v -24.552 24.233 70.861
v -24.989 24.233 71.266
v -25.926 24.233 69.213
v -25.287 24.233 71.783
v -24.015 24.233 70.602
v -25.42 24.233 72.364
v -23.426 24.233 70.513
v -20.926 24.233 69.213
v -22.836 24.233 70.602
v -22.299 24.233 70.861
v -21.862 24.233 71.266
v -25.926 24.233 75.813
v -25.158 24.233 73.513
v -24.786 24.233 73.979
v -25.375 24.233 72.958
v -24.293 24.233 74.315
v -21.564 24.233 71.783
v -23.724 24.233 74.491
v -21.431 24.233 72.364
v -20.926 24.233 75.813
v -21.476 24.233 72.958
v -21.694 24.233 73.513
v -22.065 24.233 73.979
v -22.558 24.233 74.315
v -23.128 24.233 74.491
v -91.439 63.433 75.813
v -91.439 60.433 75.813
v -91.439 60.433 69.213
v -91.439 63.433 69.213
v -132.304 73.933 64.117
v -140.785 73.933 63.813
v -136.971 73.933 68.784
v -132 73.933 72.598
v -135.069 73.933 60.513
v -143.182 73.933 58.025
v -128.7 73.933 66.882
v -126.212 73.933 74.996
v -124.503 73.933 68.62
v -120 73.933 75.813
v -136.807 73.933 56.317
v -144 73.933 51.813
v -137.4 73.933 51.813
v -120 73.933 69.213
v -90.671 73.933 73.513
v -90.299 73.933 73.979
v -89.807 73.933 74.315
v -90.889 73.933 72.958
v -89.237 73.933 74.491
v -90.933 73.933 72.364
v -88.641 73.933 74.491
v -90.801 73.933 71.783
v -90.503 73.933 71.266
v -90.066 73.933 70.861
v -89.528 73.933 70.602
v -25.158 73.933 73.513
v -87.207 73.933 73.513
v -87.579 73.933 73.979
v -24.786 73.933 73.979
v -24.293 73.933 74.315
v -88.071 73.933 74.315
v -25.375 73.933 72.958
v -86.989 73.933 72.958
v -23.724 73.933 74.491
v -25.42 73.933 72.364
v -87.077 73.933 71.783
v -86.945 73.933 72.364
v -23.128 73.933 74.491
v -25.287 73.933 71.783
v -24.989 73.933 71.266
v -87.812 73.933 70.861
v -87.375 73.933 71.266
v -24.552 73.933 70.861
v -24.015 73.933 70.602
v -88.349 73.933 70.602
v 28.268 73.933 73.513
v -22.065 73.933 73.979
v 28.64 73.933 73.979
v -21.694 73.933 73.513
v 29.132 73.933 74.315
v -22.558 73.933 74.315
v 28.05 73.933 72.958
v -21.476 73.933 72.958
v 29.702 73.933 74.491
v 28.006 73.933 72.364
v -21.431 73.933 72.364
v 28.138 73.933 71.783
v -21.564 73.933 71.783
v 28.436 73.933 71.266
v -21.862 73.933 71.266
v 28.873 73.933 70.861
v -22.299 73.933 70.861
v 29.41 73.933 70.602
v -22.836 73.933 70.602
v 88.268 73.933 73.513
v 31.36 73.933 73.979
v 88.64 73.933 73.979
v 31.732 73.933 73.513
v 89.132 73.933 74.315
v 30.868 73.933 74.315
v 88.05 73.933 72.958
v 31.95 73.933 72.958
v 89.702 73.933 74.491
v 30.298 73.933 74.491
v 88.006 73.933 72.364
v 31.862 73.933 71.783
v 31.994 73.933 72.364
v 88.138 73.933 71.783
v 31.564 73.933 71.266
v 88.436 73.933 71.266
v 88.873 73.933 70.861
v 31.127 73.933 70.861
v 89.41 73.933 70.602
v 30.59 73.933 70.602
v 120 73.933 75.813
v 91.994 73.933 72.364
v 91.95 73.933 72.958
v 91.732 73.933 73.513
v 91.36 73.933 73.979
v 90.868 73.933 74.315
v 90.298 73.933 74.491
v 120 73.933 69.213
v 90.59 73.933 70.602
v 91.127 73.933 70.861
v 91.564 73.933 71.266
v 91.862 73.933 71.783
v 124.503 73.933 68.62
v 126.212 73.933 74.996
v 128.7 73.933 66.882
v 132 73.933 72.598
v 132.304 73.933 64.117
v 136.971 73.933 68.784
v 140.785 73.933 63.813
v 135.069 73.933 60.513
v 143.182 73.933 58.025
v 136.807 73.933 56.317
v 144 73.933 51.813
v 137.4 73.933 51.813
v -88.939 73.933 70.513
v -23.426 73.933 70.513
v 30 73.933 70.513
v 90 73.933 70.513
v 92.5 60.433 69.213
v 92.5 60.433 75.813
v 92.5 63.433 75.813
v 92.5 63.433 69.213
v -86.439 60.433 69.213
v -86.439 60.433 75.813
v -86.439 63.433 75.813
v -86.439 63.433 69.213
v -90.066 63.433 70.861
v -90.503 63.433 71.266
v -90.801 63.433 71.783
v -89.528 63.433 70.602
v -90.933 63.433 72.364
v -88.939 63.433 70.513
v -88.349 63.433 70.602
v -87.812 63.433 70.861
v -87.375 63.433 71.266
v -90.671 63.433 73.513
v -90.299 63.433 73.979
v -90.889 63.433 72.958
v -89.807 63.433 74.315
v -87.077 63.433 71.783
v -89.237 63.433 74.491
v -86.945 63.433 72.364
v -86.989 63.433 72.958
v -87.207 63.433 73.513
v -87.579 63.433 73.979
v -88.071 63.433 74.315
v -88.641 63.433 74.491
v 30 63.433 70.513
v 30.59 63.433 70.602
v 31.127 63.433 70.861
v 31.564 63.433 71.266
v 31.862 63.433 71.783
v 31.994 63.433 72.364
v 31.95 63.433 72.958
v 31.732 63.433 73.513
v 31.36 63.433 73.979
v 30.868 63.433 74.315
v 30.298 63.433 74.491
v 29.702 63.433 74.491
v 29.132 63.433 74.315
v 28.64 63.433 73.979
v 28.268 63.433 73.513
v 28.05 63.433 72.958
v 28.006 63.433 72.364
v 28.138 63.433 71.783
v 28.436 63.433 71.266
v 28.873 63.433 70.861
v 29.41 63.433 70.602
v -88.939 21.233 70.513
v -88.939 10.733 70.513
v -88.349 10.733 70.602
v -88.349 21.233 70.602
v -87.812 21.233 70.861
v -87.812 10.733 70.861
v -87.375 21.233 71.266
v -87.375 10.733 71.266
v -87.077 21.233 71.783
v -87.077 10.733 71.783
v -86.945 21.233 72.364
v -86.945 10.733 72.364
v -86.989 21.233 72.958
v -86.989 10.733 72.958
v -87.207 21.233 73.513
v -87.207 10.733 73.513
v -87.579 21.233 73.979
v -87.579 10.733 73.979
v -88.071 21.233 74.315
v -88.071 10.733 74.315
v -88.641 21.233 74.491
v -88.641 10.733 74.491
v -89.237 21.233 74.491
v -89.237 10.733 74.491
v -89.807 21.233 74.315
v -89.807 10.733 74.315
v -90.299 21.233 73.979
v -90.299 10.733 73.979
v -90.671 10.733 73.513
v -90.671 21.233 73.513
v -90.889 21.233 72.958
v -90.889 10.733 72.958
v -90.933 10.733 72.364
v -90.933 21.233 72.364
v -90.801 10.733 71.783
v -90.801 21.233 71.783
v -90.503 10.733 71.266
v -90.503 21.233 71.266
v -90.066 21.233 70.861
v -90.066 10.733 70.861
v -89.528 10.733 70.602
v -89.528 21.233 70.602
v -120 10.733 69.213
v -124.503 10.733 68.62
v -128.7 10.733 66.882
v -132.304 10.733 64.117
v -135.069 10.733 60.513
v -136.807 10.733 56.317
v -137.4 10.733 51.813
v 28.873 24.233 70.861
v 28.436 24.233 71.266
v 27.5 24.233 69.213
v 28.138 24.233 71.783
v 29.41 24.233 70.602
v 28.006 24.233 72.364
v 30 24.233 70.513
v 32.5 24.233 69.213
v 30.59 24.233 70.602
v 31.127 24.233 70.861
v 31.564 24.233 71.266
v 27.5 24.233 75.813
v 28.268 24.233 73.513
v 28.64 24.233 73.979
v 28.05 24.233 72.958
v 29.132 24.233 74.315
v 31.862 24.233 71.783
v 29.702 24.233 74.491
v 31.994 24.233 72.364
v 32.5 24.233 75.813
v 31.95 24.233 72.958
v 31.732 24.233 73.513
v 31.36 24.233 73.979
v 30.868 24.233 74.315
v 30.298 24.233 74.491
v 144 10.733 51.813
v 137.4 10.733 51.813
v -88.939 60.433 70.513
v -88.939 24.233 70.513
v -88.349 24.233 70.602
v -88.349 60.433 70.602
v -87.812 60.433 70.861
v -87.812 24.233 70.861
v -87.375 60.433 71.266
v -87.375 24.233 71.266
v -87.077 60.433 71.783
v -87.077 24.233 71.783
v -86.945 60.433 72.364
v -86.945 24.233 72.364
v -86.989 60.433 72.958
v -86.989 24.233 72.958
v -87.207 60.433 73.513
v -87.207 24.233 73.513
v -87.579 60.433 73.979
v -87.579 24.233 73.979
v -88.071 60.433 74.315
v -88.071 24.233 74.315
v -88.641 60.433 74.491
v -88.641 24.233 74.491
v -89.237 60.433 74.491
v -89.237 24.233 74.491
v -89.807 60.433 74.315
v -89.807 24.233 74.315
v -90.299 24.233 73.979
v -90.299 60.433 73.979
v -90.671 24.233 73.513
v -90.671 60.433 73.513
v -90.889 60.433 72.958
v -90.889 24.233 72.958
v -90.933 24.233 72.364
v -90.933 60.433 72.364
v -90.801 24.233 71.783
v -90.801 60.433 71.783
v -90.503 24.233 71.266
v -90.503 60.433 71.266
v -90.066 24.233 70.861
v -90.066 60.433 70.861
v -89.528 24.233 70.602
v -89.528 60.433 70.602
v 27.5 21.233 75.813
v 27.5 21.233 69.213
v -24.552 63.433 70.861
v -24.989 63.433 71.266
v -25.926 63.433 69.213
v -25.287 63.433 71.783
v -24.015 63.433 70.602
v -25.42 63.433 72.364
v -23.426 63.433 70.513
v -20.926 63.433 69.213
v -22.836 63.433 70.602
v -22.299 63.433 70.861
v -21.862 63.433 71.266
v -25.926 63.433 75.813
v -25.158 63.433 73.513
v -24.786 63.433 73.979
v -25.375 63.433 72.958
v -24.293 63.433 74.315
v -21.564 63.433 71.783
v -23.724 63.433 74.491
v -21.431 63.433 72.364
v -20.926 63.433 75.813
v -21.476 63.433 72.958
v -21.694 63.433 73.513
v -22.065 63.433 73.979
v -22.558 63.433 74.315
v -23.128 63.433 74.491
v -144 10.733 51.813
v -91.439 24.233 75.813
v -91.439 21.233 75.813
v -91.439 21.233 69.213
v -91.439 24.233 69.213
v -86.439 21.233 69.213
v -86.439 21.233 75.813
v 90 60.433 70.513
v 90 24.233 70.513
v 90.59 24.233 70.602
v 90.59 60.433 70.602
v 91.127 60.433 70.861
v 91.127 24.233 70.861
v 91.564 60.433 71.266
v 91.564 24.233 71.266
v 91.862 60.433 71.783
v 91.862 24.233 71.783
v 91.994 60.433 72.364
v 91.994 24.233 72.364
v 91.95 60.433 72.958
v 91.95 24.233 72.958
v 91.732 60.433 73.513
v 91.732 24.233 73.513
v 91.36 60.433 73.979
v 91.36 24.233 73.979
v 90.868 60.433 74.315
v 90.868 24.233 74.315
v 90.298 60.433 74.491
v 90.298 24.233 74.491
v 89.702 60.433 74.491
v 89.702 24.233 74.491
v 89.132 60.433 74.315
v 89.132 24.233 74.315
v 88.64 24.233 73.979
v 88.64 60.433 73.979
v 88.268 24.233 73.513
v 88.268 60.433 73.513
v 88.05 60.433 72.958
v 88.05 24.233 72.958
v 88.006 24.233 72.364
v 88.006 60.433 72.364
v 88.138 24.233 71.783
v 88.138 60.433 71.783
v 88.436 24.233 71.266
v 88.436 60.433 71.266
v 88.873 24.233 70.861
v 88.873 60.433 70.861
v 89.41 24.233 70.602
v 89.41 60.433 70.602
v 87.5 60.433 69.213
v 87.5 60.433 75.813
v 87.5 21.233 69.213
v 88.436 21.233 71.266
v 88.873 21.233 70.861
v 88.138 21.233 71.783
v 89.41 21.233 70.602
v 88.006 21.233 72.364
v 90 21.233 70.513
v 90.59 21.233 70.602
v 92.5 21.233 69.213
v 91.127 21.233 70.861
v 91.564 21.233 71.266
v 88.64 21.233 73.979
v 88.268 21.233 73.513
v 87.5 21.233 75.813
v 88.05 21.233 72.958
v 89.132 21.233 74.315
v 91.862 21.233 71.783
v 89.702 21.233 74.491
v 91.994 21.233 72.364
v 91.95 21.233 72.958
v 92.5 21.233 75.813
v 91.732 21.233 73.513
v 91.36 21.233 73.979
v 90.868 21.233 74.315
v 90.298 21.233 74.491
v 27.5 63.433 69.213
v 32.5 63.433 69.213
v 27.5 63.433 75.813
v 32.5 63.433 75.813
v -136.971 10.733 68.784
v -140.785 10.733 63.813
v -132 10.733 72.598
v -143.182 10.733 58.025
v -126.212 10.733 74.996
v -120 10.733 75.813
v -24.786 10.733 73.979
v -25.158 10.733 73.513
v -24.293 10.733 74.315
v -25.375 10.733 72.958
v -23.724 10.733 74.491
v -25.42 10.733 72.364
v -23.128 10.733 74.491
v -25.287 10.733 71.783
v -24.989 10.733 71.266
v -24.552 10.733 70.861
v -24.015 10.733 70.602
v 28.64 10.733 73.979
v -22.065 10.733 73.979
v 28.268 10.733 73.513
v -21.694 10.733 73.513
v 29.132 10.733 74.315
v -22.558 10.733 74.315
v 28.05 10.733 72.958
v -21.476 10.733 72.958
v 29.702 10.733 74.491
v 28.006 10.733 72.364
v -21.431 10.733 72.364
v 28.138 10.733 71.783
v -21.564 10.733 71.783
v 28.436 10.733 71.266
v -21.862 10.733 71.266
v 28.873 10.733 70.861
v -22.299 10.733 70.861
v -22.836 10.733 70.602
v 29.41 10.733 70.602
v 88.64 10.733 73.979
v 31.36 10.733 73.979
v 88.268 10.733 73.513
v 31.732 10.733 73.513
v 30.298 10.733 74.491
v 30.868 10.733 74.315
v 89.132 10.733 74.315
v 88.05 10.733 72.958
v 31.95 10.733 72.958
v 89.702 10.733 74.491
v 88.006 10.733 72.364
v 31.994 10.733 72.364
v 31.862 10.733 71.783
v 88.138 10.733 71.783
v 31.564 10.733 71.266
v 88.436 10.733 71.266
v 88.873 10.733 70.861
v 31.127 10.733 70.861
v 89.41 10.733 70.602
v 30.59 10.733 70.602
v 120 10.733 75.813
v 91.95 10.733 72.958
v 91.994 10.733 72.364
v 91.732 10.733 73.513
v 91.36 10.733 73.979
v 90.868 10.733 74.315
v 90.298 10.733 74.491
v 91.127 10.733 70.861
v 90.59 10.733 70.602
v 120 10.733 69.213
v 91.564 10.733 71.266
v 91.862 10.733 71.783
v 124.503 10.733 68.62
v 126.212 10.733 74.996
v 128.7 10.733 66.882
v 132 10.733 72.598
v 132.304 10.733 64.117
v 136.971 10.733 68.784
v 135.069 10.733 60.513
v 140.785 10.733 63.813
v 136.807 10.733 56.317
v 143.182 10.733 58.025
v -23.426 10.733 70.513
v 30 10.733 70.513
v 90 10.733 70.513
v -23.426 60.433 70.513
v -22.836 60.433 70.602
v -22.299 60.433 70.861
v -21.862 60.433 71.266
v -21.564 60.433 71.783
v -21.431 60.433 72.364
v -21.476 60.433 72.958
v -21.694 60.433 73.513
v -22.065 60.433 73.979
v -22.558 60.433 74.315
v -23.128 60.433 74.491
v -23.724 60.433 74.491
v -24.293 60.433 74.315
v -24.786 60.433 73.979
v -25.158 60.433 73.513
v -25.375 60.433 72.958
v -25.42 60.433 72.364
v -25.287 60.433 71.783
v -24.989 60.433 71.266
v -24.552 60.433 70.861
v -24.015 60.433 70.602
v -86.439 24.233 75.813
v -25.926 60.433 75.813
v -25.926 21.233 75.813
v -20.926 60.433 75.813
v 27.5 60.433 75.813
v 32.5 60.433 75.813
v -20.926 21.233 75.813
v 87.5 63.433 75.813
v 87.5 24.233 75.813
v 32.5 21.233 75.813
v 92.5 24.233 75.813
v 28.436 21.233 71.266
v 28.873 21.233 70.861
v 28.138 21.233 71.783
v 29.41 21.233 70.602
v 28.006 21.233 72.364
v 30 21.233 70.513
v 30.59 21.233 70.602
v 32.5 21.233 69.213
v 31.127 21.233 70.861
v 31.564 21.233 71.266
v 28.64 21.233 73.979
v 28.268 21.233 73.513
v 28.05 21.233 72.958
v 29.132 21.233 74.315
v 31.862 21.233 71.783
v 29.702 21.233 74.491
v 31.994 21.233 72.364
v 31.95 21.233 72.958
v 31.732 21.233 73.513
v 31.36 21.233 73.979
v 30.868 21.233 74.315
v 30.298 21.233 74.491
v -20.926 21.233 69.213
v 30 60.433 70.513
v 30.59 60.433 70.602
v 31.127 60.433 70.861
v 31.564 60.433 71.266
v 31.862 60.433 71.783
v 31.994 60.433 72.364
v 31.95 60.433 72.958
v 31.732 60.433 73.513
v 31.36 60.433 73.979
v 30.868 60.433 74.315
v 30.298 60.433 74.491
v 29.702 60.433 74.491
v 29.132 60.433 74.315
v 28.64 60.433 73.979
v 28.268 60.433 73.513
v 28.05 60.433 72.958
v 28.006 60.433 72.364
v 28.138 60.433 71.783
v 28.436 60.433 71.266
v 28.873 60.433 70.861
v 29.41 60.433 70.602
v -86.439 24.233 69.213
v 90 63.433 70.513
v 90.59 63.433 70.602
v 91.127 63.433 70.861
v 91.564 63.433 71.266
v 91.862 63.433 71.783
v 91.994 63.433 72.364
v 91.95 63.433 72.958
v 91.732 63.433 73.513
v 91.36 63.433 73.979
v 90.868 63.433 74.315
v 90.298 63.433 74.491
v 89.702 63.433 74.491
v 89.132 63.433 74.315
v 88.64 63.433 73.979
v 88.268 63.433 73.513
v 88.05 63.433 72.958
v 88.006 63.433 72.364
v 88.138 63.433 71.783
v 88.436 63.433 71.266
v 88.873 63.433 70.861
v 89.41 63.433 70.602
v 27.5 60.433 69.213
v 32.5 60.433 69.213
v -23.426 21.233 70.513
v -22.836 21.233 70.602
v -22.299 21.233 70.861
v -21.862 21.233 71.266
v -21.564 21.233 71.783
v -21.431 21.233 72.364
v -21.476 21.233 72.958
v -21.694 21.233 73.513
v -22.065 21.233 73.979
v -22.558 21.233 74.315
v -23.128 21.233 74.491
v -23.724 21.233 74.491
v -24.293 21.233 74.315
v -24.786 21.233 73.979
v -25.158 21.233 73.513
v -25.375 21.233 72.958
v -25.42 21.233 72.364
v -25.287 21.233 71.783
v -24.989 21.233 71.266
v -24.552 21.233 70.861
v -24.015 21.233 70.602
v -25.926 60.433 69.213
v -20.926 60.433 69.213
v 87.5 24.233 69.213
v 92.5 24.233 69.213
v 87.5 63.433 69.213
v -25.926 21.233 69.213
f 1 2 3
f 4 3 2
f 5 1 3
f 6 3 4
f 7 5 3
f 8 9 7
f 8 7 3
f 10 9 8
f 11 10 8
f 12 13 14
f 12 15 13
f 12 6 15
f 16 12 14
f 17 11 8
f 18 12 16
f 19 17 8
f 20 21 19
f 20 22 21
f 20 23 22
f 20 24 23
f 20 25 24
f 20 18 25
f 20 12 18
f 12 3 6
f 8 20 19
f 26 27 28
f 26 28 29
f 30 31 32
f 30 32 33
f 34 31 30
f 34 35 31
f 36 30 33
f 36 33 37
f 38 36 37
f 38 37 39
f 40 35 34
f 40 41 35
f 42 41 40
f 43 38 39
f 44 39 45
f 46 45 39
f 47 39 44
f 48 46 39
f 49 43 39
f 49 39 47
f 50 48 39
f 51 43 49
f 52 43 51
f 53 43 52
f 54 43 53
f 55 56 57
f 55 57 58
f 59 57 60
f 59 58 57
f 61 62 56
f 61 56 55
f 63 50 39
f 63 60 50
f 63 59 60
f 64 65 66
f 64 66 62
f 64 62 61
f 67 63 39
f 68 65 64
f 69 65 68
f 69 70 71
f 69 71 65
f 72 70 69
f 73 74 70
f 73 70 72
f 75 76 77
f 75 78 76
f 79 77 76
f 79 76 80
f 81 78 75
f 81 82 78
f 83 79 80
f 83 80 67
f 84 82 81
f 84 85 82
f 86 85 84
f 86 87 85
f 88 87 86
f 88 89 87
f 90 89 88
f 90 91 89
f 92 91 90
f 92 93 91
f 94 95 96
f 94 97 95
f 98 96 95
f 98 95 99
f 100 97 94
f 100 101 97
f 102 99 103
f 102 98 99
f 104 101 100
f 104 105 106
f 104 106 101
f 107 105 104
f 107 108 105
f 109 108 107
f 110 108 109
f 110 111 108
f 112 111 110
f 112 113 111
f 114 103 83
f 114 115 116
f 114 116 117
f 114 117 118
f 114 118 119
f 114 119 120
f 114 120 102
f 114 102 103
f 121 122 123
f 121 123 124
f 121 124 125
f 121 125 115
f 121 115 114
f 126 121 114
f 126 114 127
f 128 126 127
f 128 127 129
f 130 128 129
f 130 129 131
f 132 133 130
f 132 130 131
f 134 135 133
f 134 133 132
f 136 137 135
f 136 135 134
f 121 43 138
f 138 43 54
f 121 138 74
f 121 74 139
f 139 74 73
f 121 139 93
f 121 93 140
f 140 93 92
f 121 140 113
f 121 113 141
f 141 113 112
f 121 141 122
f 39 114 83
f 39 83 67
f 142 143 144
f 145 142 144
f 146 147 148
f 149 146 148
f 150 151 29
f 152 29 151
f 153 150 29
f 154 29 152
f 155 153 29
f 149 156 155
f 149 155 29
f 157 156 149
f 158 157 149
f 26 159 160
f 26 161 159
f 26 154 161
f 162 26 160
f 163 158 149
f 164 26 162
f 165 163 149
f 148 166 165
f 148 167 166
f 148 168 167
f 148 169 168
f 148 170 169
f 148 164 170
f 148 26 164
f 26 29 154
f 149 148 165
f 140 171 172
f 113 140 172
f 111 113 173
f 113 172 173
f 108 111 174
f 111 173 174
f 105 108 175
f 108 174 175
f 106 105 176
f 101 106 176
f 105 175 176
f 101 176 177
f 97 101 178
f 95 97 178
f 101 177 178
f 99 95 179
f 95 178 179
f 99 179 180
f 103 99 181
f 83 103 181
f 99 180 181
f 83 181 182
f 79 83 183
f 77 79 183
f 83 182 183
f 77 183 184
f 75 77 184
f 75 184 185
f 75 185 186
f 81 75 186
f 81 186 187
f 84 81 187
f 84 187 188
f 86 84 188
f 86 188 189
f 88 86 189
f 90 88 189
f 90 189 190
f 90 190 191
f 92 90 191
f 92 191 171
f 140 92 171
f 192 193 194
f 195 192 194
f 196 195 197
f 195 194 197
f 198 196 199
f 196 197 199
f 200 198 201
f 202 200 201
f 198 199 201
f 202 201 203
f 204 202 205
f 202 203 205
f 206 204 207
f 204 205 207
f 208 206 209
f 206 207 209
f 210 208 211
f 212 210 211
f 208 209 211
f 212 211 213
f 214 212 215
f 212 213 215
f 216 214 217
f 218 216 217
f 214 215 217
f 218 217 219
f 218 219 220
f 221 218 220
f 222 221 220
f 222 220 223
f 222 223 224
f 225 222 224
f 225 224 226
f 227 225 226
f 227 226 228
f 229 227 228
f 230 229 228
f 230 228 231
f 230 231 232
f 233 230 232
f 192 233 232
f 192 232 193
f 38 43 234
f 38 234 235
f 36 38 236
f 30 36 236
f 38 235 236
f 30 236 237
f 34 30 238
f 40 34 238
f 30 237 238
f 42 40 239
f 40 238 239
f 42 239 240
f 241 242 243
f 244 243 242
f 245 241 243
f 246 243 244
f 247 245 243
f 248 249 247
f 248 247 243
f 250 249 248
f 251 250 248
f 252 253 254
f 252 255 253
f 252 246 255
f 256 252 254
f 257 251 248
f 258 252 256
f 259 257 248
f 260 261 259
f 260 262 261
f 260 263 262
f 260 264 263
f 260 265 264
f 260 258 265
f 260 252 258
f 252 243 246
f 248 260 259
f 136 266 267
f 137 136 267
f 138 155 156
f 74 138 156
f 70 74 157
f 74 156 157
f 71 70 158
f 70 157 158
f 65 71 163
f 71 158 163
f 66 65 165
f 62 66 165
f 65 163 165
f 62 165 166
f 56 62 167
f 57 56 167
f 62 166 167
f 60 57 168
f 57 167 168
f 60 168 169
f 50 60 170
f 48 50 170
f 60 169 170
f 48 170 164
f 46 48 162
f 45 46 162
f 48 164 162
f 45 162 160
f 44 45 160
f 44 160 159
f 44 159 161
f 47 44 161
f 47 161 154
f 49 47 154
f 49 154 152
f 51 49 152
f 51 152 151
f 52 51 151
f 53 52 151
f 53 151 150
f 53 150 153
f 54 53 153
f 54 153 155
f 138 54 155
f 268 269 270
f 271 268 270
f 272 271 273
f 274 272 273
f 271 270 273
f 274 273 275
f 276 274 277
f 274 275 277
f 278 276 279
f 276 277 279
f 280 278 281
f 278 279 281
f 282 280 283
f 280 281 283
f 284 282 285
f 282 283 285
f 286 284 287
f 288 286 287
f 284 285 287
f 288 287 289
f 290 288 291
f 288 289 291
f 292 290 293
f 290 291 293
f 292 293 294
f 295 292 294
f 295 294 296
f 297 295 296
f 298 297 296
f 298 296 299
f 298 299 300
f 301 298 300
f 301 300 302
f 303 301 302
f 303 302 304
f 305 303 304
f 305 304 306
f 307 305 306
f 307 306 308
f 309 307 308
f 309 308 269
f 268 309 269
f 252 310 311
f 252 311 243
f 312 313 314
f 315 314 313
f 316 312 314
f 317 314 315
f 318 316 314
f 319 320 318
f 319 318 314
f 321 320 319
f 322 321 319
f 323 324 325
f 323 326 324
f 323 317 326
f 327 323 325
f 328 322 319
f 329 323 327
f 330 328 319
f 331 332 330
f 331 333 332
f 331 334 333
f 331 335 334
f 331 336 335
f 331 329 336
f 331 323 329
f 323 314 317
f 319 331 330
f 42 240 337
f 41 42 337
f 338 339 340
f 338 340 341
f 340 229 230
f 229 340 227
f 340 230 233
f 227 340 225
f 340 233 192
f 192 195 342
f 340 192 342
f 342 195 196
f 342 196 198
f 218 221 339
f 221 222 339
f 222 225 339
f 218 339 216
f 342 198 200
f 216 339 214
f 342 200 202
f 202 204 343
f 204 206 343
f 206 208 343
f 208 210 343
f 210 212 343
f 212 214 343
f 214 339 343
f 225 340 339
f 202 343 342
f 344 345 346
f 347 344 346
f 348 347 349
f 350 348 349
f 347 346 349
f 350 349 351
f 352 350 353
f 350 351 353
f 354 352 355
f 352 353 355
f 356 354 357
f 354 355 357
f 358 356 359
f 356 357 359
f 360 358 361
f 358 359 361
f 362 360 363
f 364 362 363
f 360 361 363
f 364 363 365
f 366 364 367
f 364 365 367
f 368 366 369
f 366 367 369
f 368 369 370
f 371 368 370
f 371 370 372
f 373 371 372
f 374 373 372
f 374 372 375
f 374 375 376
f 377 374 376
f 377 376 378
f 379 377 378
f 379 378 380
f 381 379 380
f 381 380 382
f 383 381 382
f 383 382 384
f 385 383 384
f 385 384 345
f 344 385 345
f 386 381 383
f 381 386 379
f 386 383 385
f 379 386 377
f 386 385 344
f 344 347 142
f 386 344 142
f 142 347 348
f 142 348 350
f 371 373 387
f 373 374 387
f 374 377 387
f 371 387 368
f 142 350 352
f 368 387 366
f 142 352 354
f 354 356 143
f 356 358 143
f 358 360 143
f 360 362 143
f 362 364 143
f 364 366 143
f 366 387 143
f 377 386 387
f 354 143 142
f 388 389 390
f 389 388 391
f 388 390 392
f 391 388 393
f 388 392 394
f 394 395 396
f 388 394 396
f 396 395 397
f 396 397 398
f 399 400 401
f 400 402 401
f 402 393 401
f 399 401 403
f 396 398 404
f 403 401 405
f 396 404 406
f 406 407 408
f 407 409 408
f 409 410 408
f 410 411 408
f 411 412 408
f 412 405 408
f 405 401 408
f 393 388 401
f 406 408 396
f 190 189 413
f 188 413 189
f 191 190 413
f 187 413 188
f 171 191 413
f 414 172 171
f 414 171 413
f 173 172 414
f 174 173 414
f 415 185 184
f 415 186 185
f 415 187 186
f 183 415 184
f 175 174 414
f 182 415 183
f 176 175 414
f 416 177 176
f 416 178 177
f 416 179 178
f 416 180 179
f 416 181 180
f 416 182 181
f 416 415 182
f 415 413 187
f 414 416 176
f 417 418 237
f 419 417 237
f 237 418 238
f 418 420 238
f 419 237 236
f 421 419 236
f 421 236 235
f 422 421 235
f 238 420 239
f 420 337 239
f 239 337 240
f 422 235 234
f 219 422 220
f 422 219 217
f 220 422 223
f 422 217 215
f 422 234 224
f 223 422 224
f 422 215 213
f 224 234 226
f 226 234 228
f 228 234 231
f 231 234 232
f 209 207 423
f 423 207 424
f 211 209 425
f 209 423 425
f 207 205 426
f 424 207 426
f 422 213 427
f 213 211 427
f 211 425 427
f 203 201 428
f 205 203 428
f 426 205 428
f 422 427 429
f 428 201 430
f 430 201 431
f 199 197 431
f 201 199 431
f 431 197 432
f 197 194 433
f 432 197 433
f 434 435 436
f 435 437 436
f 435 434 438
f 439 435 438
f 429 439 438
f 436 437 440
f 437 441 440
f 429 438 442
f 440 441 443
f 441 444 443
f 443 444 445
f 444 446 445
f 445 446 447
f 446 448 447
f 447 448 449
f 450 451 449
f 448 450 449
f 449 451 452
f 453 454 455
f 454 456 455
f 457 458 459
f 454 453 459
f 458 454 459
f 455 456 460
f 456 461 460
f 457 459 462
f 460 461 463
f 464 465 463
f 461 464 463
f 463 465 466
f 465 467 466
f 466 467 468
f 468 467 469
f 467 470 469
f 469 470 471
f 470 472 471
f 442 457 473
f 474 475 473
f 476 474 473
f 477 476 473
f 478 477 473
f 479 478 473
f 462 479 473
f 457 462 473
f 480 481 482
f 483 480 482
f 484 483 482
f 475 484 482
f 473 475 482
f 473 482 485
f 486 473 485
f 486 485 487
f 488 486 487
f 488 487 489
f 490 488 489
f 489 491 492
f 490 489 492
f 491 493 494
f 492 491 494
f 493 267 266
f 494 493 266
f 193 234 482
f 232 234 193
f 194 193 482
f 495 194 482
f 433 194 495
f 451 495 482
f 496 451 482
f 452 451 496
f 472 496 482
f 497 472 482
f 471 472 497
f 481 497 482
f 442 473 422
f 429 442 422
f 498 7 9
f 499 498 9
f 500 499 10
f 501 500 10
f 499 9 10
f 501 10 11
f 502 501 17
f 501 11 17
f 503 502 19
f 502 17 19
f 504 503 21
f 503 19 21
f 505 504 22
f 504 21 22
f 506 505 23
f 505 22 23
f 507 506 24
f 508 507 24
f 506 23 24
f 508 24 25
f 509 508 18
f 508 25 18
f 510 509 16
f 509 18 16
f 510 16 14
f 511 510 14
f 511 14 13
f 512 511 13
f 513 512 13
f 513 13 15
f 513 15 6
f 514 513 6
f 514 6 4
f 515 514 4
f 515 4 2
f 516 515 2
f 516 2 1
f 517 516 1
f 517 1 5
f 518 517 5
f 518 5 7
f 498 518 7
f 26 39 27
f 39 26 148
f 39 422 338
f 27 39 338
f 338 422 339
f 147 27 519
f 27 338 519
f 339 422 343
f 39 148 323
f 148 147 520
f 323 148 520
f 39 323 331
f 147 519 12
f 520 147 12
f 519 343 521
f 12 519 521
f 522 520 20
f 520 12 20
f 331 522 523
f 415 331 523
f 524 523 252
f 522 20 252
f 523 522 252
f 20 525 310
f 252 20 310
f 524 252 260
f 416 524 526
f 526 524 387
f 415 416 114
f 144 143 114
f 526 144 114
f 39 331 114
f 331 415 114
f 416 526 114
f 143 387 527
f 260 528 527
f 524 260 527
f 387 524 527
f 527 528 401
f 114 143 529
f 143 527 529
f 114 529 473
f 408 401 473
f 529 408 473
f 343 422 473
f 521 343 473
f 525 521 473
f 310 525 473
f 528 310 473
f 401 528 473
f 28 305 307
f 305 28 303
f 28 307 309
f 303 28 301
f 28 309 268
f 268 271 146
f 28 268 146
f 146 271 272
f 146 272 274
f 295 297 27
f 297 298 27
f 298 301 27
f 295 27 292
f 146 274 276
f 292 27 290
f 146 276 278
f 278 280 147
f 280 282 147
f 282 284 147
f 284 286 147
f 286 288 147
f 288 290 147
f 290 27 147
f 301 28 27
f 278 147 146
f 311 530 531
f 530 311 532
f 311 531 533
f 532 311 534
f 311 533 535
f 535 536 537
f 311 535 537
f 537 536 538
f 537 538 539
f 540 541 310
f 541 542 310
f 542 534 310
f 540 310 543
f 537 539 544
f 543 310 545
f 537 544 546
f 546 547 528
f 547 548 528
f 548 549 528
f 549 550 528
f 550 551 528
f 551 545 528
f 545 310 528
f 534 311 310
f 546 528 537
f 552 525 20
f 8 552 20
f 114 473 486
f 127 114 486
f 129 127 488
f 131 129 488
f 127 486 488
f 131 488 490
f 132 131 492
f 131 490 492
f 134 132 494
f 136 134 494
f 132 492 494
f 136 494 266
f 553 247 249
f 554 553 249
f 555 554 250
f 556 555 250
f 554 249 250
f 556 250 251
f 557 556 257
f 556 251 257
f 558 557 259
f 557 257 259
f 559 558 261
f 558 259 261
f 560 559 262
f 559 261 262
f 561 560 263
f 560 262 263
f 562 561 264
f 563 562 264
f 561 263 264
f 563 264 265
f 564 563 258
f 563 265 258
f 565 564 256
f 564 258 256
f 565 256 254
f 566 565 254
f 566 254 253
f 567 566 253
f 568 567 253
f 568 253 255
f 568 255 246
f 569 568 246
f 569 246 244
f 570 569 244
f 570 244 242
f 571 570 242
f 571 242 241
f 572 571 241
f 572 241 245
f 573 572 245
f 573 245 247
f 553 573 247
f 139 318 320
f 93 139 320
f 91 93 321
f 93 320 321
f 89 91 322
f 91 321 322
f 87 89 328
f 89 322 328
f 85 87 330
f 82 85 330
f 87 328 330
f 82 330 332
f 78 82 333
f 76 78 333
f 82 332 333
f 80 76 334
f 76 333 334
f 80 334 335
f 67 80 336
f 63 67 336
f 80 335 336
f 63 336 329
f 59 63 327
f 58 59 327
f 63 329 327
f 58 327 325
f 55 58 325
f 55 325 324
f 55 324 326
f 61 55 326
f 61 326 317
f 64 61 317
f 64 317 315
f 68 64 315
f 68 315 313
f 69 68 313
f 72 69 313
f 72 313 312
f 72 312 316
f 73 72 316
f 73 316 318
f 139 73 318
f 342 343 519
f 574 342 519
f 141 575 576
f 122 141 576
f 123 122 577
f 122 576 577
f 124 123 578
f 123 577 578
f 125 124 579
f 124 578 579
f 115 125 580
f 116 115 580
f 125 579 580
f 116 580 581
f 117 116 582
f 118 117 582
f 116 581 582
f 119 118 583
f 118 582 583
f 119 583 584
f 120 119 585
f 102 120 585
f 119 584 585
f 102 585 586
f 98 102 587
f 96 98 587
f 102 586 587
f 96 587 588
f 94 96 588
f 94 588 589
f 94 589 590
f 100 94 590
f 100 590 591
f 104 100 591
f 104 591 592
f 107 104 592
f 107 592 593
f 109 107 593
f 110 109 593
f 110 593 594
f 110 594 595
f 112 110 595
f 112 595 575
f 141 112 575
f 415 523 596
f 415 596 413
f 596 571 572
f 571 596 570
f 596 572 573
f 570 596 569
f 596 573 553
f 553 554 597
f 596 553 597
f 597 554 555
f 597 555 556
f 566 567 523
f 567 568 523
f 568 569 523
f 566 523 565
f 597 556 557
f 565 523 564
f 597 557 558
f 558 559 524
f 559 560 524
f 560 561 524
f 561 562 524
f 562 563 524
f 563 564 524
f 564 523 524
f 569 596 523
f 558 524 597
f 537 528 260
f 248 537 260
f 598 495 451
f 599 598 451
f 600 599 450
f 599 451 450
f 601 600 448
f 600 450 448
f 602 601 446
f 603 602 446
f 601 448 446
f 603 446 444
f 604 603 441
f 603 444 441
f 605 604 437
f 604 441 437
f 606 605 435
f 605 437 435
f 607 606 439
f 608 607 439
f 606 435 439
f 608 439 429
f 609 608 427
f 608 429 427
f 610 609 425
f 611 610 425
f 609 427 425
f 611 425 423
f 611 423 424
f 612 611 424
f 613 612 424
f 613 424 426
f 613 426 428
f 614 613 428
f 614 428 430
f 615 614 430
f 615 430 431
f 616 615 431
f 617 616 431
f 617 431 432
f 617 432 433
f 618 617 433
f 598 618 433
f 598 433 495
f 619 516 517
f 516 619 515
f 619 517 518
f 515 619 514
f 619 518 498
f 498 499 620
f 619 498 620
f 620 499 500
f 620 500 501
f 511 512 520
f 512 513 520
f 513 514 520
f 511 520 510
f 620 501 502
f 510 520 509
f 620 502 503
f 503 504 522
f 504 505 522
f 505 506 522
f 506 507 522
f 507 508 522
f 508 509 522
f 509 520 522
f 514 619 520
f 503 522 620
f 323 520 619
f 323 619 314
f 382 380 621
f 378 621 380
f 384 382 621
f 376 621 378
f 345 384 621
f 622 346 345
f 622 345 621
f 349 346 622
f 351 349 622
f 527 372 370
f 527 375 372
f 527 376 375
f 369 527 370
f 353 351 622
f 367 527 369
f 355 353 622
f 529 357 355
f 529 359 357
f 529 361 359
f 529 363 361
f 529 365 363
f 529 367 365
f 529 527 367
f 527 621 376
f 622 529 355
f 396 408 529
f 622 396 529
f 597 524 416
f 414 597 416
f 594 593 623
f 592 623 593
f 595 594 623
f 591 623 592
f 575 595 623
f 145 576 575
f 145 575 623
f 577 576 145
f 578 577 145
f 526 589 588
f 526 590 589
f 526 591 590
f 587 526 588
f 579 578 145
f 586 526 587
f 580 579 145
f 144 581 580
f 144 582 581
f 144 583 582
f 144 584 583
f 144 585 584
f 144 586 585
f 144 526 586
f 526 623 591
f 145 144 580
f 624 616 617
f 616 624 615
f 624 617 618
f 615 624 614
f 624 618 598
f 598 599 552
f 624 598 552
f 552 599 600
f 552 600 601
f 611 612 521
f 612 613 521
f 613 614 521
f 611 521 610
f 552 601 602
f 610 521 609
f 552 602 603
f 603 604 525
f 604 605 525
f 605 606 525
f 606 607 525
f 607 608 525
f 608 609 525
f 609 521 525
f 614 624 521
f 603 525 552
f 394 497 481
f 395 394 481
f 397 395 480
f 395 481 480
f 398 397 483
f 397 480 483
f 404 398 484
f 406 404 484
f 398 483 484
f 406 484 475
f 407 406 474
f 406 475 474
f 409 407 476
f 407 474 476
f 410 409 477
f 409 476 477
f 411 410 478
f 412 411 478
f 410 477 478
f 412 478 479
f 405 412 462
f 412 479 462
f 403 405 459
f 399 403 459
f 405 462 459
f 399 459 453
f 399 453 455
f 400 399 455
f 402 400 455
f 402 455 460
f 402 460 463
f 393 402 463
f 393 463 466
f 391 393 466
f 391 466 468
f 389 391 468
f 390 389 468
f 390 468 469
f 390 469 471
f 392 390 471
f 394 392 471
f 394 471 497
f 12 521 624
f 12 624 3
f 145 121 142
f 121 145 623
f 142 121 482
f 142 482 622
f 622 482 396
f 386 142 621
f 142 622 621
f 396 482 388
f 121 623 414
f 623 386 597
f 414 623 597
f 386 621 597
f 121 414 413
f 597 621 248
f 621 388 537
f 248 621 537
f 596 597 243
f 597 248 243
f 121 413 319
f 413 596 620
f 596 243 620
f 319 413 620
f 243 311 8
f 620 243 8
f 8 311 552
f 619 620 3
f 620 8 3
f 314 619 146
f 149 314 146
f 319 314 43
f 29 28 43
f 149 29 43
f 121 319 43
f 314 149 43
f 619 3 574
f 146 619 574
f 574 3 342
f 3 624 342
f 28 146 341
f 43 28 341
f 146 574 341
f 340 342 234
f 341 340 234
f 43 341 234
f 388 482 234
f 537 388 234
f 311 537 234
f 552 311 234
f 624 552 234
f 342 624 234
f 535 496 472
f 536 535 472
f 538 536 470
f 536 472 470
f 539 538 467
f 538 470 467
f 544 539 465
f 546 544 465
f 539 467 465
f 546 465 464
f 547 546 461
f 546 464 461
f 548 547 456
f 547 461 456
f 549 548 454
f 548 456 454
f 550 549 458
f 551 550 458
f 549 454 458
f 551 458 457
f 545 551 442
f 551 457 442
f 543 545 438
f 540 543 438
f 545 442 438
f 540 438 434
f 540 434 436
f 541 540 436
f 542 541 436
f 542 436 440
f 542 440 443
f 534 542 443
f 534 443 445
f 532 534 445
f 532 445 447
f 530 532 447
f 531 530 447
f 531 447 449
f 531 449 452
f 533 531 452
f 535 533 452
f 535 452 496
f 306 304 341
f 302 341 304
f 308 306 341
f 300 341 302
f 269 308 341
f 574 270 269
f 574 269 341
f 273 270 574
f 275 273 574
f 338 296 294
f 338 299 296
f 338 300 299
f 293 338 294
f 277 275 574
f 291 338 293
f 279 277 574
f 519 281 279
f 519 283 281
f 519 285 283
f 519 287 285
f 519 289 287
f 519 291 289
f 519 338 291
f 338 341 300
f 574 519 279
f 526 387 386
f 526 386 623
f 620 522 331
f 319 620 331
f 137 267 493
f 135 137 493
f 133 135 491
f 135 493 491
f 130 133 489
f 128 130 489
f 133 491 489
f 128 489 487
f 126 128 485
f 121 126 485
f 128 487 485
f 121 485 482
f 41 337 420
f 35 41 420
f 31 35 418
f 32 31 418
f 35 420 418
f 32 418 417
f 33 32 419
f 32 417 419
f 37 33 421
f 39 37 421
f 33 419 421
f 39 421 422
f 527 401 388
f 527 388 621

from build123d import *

# Parameters (mm, degrees)
BOSS_EXTRUDE1_DEPTH      = 16
BOSS_EXTRUDE2_DEPTH      = 46.583974855
BOSS_EXTRUDE2_DEPTH_BACK = 46.58397486
SKETCH4_R                = 3.3
CUT_EXTRUDE1_DEPTH       = 32.2
CUT_EXTRUDE1_DEPTH_BACK  = 32.2
SKETCH5_R                = 3.3
SKETCH6_W                = 20
SKETCH6_H                = 11
BOSS_EXTRUDE3_DEPTH      = 30
CUT_EXTRUDE2_DEPTH       = 233.824504724
CUT_EXTRUDE2_DEPTH_BACK  = 233.824504724
SKETCH7_R                = 2
SKETCH8_W                = 40
SKETCH8_H                = 11
CUT_EXTRUDE3_DEPTH       = 40
SKETCH9_R                = 2
CUT_EXTRUDE4_DEPTH       = 40
FILLET1_R                = 20
BOSS_EXTRUDE4_DEPTH      = 52.66666667
SKETCH11_W               = 287.599331825
SKETCH11_H               = 200.78083169
CUT_EXTRUDE5_DEPTH       = 16
SCALE1_START             = 16
SCALE1_DEPTH             = 52.66666667
SCALE1_START_2           = 2.833333333
SCALE1_2_DEPTH           = 79.000000004
SKETCH15_W               = 527.18296214
SKETCH15_H               = 284.392361206
CUT_EXTRUDE9_DEPTH       = 200
SCALE2_SCALE             = 0.8
SKETCH23_R               = 2
CUT_EXTRUDE15_DEPTH      = 175.579201349
SKETCH25_R               = 2
CUT_EXTRUDE18_DEPTH      = 175.579201349
SKETCH28_W               = 5
SKETCH28_H               = 3
CUT_EXTRUDE19_DEPTH      = 164.640269427


# Read off the part's stored shape, not the designer's step: Scale1
with BuildPart() as part:
    # Sketch1 → Boss-Extrude1 (new body)
    with BuildSketch(Plane(origin=(0, 0, 0), x_dir=(1, 0, 0), z_dir=(0, 1, 0))):
        Polygon((-120, -37.5), (-120, -75), (0, -75), (0, 75), (-120, 75), (-120, 37.5), (-220, 37.5), (-220, -37.5), align=None)
    extrude(amount=BOSS_EXTRUDE1_DEPTH)

    # Sketch4 → Boss-Extrude2 (add, two sides: drawn at the far end of the back side and taken through both)
    # profile 1 of 2: a face of its own
    with BuildSketch(Plane.ZY.offset(170).offset(-BOSS_EXTRUDE2_DEPTH_BACK)):
        with BuildLine():
            Line((37.5, 16), (43.5, 16))
            ThreePointArc((43.5, 16), (51.5, 8), (43.5, 0))
            Line((43.5, 0), (37.5, 0))
            Line((37.5, 0), (37.5, 16))
        make_face()
        with Locations((43.5, 8)):
            Circle(SKETCH4_R, mode=Mode.SUBTRACT)
    # profile 2 of 2: a face of its own
    with BuildSketch(Plane.ZY.offset(170).offset(-BOSS_EXTRUDE2_DEPTH_BACK)):
        with BuildLine():
            Line((-37.5, 0), (-43.5, 0))
            ThreePointArc((-43.5, 0), (-51.5, 8), (-43.5, 16))
            Line((-43.5, 16), (-37.5, 16))
            Line((-37.5, 16), (-37.5, 0))
        make_face()
        with Locations((-43.5, 8)):
            Circle(SKETCH4_R, mode=Mode.SUBTRACT)
    extrude(amount=BOSS_EXTRUDE2_DEPTH + BOSS_EXTRUDE2_DEPTH_BACK)

    # Sketch5 → Cut-Extrude1 (cut, two sides: drawn at the far end of the back side and taken through both)
    # profile 1 of 2: a face of its own
    with BuildSketch(Plane.ZY.offset(170).offset(-CUT_EXTRUDE1_DEPTH_BACK)):
        with BuildLine():
            Line((-43.5, 16), (-37.5, 16))
            Line((-37.5, 16), (-37.5, 0))
            Line((-37.5, 0), (-43.5, 0))
            ThreePointArc((-43.5, 0), (-51.5, 8), (-43.5, 16))
        make_face()
        with Locations((-43.5, 8)):
            Circle(SKETCH5_R, mode=Mode.SUBTRACT)
    # profile 2 of 2: a face of its own
    with BuildSketch(Plane.ZY.offset(170).offset(-CUT_EXTRUDE1_DEPTH_BACK)):
        with BuildLine():
            Line((37.5, 0), (43.5, 0))
            ThreePointArc((43.5, 0), (51.5, 8), (43.5, 16))
            Line((43.5, 16), (37.5, 16))
            Line((37.5, 16), (37.5, 0))
        make_face()
        with Locations((43.5, 8)):
            Circle(SKETCH5_R, mode=Mode.SUBTRACT)
    extrude(amount=CUT_EXTRUDE1_DEPTH + CUT_EXTRUDE1_DEPTH_BACK, mode=Mode.SUBTRACT)

    # Sketch6 → Boss-Extrude3 (add)
    with BuildSketch(Plane(origin=(0, 0, 0), x_dir=(0, 0, -1), z_dir=(1, 0, 0))):
        with Locations((-50, 8)):
            Rectangle(SKETCH6_W, SKETCH6_H)
        with Locations((50, 8)):
            Rectangle(SKETCH6_W, SKETCH6_H)
    extrude(amount=BOSS_EXTRUDE3_DEPTH)

    # Sketch7 → Cut-Extrude2 (cut, two sides: drawn at the far end of the back side and taken through both)
    with BuildSketch(Plane(origin=(0, 13.5, 0), x_dir=(1, 0, 0), z_dir=(0, 1, 0)).offset(-CUT_EXTRUDE2_DEPTH_BACK)):
        with Locations(Location((22.5, 50, 0), (0, 0, 270))):
            Circle(SKETCH7_R)
        with Locations(Location((22.5, -50, 0), (0, 0, 270))):
            Circle(SKETCH7_R)
    extrude(amount=CUT_EXTRUDE2_DEPTH + CUT_EXTRUDE2_DEPTH_BACK, mode=Mode.SUBTRACT)

    # Sketch8 → Cut-Extrude3 (cut)
    with BuildSketch(Plane(origin=(0, 0, 0), x_dir=(0, 0, -1), z_dir=(1, 0, 0))):
        with Locations((0, 8)):
            Rectangle(SKETCH8_W, SKETCH8_H)
    extrude(amount=-CUT_EXTRUDE3_DEPTH, mode=Mode.SUBTRACT)

    # Sketch9 → Cut-Extrude4 (cut)
    with BuildSketch(Plane(origin=(0, 16, 0), x_dir=(1, 0, 0), z_dir=(0, 1, 0))):
        with Locations(Location((-32.5, 0, 0), (0, 0, 270))):
            Circle(SKETCH9_R)
    extrude(amount=-CUT_EXTRUDE4_DEPTH, mode=Mode.SUBTRACT)

    # Fillet1
    # the kernel refuses this fillet: 20 mm, written as the material it takes off along each edge
    with BuildSketch(Plane(origin=(-220, -27.947694226, -37.5), x_dir=(0, 0, 1), z_dir=(0, 1, 0))) as fillet1_piece_1:
        with BuildLine():
            CenterArc((11.17907769, 20), FILLET1_R, 236.01651728, 33.98348272)
            Line((0, 3.416025145), (-0.223581554, 3.084345648))
            ThreePointArc((-0.223581554, 3.084345648), (-0.4, 1.708012572), (-0.4, 0))
            Line((-0.4, 0), (0, -0.4))
            Line((0, -0.4), (11.17907769, -0.4))
            Line((11.17907769, -0.4), (11.17907769, 0))
        make_face()
    extrude(amount=71.895388452, mode=Mode.SUBTRACT)
    with BuildSketch(Plane(origin=(-220, -27.947694226, 37.5), x_dir=(1, 0, 0), z_dir=(0, 1, 0))) as fillet1_piece_2:
        with BuildLine():
            CenterArc((20, 11.17907769), FILLET1_R, 180, 33.98348272)
            Line((0, 11.17907769), (-0.4, 11.17907769))
            Line((-0.4, 11.17907769), (-0.4, 0))
            Line((-0.4, 0), (0, -0.4))
            ThreePointArc((0, -0.4), (1.708012572, -0.4), (3.084345648, -0.223581554))
            Line((3.084345648, -0.223581554), (3.416025145, 0))
        make_face()
    extrude(amount=71.895388452, mode=Mode.SUBTRACT)
    with BuildSketch(Plane(origin=(-120, -50, -75), x_dir=(1, 0, 0), z_dir=(0, 1, 0)), Plane(origin=(-120, -50, 75), x_dir=(0, 0, -1), z_dir=(0, 1, 0))) as fillet1_piece_3:
        with BuildLine():
            CenterArc((FILLET1_R, -FILLET1_R), FILLET1_R, 90, 90)
            Line((0, -FILLET1_R), (-FILLET1_R * 0.02, -FILLET1_R))
            Line((-FILLET1_R * 0.02, -FILLET1_R), (-FILLET1_R * 0.02, FILLET1_R * 0.02))
            Line((-FILLET1_R * 0.02, FILLET1_R * 0.02), (FILLET1_R, FILLET1_R * 0.02))
            Line((FILLET1_R, FILLET1_R * 0.02), (FILLET1_R, 0))
        make_face()
    extrude(amount=116, mode=Mode.SUBTRACT)

    # Sketch10 → Boss-Extrude4 (add)
    with BuildSketch(Plane(origin=(0, 16, 0), x_dir=(1, 0, 0), z_dir=(0, 1, 0))):
        with BuildLine():
            Line((0, 69.5), (-100, 69.5))
            ThreePointArc((-100, 69.5), (-110.253048327, 65.253048327), (-114.5, 55))
            Line((-114.5, 55), (-120, 55))
            ThreePointArc((-120, 55), (-114.142135624, 69.142135624), (-100, 75))
            Line((-100, 75), (0, 75))
            Line((0, 75), (100, 75))
            ThreePointArc((100, 75), (114.142135624, 69.142135624), (120, 55))
            Line((120, 55), (114.5, 55))
            ThreePointArc((114.5, 55), (110.253048327, 65.253048327), (100, 69.5))
            Line((100, 69.5), (0, 69.5))
        make_face()
        with BuildLine():
            Line((0, -75), (100, -75))
            ThreePointArc((100, -75), (114.142135624, -69.142135624), (120, -55))
            Line((120, -55), (114.5, -55))
            ThreePointArc((114.5, -55), (110.253048327, -65.253048327), (100, -69.5))
            Line((100, -69.5), (0, -69.5))
            Line((0, -69.5), (-100, -69.5))
            ThreePointArc((-100, -69.5), (-110.253048327, -65.253048327), (-114.5, -55))
            Line((-114.5, -55), (-120, -55))
            ThreePointArc((-120, -55), (-114.142135624, -69.142135624), (-100, -75))
            Line((-100, -75), (0, -75))
        make_face()
    extrude(amount=BOSS_EXTRUDE4_DEPTH)

    # Sketch11 → Cut-Extrude5 (cut)
    with BuildSketch(Plane.XZ):
        with Locations((-109.164099046, 3.949352656)):
            Rectangle(SKETCH11_W, SKETCH11_H)
    extrude(amount=-CUT_EXTRUDE5_DEPTH, mode=Mode.SUBTRACT)


with BuildPart() as cut_extrude5_piece_1:
    # of the separate pieces the step leaves, piece 1, a body of its own (cut_extrude5_pieces)
    add(part.part.solids().sort_by_distance((-100, 16, 75))[0])


with BuildPart() as cut_extrude5_piece_2:
    # of the separate pieces the step leaves, piece 2, a body of its own (cut_extrude5_pieces)
    add(part.part.solids().sort_by_distance((-114.5, 16, -55))[0])


with BuildPart() as scale1_tool:
    # Scale1 outline → Scale1 (new body)
    with BuildSketch(Plane(origin=(0, 0, 0), x_dir=(1, 0, 0), z_dir=(0, 1, 0)).offset(SCALE1_START)):
        with BuildLine():
            Line((104.502391105, -68.783267912), (114.492119434, -68.783267912))
            ThreePointArc((114.492119434, -68.783267912), (118.572054123, -62.421509662), (120, -55))
            Line((120, -55), (114.5, -55))
            ThreePointArc((114.5, -55), (111.737433088, -63.513675146), (104.502391105, -68.783267912))
        make_face()
        with BuildLine():
            Line((-114.492119434, -68.783267912), (-104.502391105, -68.783267912))
            ThreePointArc((-104.502391105, -68.783267912), (-111.737433088, -63.513675146), (-114.5, -55))
            Line((-114.5, -55), (-120, -55))
            ThreePointArc((-120, -55), (-118.572054123, -62.421509662), (-114.492119434, -68.783267912))
        make_face()
        with BuildLine():
            Line((-104.502391105, 68.783267912), (-114.492119434, 68.783267912))
            ThreePointArc((-114.492119434, 68.783267912), (-118.572054123, 62.421509662), (-120, 55))
            Line((-120, 55), (-114.5, 55))
            ThreePointArc((-114.5, 55), (-111.737433088, 63.513675146), (-104.502391105, 68.783267912))
        make_face()
        with BuildLine():
            ThreePointArc((120, 55), (118.572054123, 62.421509662), (114.492119434, 68.783267912))
            Line((114.492119434, 68.783267912), (104.502391105, 68.783267912))
            ThreePointArc((104.502391105, 68.783267912), (111.737433088, 63.513675146), (114.5, 55))
            Line((114.5, 55), (120, 55))
        make_face()
    extrude(amount=SCALE1_DEPTH)


with BuildPart() as cut_extrude5_piece_1_1:
    add(cut_extrude5_piece_1.part)

    # Scale1: cut by scale1_tool
    add(scale1_tool.part, mode=Mode.SUBTRACT)



with BuildPart() as cut_extrude5_piece_2_1:
    add(cut_extrude5_piece_2.part)

    # Scale1: cut by scale1_tool
    add(scale1_tool.part, mode=Mode.SUBTRACT)


with BuildPart() as cut_extrude5_piece_1_2:
    add(cut_extrude5_piece_1_1.part)

    add(cut_extrude5_piece_2_1.part)  # Scale1 2 merges Cut-Extrude5 piece 2
    # Scale1 2 outline → Scale1 2 (add)
    with BuildSketch(Plane(origin=(0, 0, 0), x_dir=(1, 0, 0), z_dir=(0, 1, 0)).offset(SCALE1_START_2)):
        with BuildLine():
            Line((180, -47.033267912), (171.75, -47.033267912))
            ThreePointArc((171.75, -47.033267912), (165.379572491, -62.412840403), (150, -68.783267912))
            Line((150, -68.783267912), (-150, -68.783267912))
            ThreePointArc((-150, -68.783267912), (-165.379572491, -62.412840403), (-171.75, -47.033267912))
            Line((-171.75, -47.033267912), (-180, -47.033267912))
            ThreePointArc((-180, -47.033267912), (-171.213203436, -68.246471348), (-150, -77.033267912))
            Line((-150, -77.033267912), (150, -77.033267912))
            ThreePointArc((150, -77.033267912), (171.213203436, -68.246471348), (180, -47.033267912))
        make_face()
        with BuildLine():
            Line((150, 77.033267912), (-150, 77.033267912))
            ThreePointArc((-150, 77.033267912), (-171.213203436, 68.246471348), (-180, 47.033267912))
            Line((-180, 47.033267912), (-171.75, 47.033267912))
            ThreePointArc((-171.75, 47.033267912), (-165.379572491, 62.412840403), (-150, 68.783267912))
            Line((-150, 68.783267912), (150, 68.783267912))
            ThreePointArc((150, 68.783267912), (165.379572491, 62.412840403), (171.75, 47.033267912))
            Line((171.75, 47.033267912), (180, 47.033267912))
            ThreePointArc((180, 47.033267912), (171.213203436, 68.246471348), (150, 77.033267912))
        make_face()
    extrude(amount=SCALE1_2_DEPTH)

    # Sketch15 → Cut-Extrude9 (cut)
    with BuildSketch(Plane.XY):
        with Locations((-4.944471508, 47.534491158)):
            Rectangle(SKETCH15_W, SKETCH15_H)
    extrude(amount=-CUT_EXTRUDE9_DEPTH, mode=Mode.SUBTRACT)


with BuildPart() as cut_extrude5_piece_1_3:
    # Scale2: scaled about (0, 42.333333335, 70.933464176)
    add(cut_extrude5_piece_1_2.part.scale(SCALE2_SCALE).moved(Location((0, 8.466666667, 14.186692835))))

    # Sketch23 → Cut-Extrude15 (cut, through all)
    with BuildSketch(Plane.XZ.offset(-10.733333333)):
        with Locations(Location((-88.93896071, 72.513307165, 0), (0, 0, 270))):
            Circle(SKETCH23_R)
    extrude(amount=-CUT_EXTRUDE15_DEPTH, mode=Mode.SUBTRACT)

    # Sketch25 → Cut-Extrude18 (cut, through all)
    with BuildSketch(Plane.XZ.offset(-10.733333333)):
        with Locations(Location((-23.42560053, 72.513307165, 0), (0, 0, 270))):
            Circle(SKETCH25_R)
        with Locations(Location((30, 72.513307165, 0), (0, 0, 270))):
            Circle(SKETCH25_R)
        with Locations(Location((-88.93896071, 72.513307165, 0), (0, 0, 270))):
            Circle(SKETCH25_R)
        with Locations(Location((90, 72.513307165, 0), (0, 0, 270))):
            Circle(SKETCH25_R)
    extrude(amount=-CUT_EXTRUDE18_DEPTH, mode=Mode.SUBTRACT)

    # Sketch28 → Cut-Extrude19 (cut, through all)
    with BuildSketch(Plane.XY.offset(75.813307165)):
        with Locations((-88.93896071, 22.733333333)):
            Rectangle(SKETCH28_W, SKETCH28_H)
        with Locations((-23.42560053, 22.733333333)):
            Rectangle(SKETCH28_W, SKETCH28_H)
        with Locations((30, 22.733333333)):
            Rectangle(SKETCH28_W, SKETCH28_H)
        with Locations((90, 22.733333333)):
            Rectangle(SKETCH28_W, SKETCH28_H)
        with Locations((90, 61.933333337)):
            Rectangle(SKETCH28_W, SKETCH28_H)
        with Locations((30, 61.933333337)):
            Rectangle(SKETCH28_W, SKETCH28_H)
        with Locations((-23.42560053, 61.933333337)):
            Rectangle(SKETCH28_W, SKETCH28_H)
        with Locations((-88.93896071, 61.933333337)):
            Rectangle(SKETCH28_W, SKETCH28_H)
    extrude(amount=-CUT_EXTRUDE19_DEPTH, mode=Mode.SUBTRACT)


solid = cut_extrude5_piece_1_3.part
